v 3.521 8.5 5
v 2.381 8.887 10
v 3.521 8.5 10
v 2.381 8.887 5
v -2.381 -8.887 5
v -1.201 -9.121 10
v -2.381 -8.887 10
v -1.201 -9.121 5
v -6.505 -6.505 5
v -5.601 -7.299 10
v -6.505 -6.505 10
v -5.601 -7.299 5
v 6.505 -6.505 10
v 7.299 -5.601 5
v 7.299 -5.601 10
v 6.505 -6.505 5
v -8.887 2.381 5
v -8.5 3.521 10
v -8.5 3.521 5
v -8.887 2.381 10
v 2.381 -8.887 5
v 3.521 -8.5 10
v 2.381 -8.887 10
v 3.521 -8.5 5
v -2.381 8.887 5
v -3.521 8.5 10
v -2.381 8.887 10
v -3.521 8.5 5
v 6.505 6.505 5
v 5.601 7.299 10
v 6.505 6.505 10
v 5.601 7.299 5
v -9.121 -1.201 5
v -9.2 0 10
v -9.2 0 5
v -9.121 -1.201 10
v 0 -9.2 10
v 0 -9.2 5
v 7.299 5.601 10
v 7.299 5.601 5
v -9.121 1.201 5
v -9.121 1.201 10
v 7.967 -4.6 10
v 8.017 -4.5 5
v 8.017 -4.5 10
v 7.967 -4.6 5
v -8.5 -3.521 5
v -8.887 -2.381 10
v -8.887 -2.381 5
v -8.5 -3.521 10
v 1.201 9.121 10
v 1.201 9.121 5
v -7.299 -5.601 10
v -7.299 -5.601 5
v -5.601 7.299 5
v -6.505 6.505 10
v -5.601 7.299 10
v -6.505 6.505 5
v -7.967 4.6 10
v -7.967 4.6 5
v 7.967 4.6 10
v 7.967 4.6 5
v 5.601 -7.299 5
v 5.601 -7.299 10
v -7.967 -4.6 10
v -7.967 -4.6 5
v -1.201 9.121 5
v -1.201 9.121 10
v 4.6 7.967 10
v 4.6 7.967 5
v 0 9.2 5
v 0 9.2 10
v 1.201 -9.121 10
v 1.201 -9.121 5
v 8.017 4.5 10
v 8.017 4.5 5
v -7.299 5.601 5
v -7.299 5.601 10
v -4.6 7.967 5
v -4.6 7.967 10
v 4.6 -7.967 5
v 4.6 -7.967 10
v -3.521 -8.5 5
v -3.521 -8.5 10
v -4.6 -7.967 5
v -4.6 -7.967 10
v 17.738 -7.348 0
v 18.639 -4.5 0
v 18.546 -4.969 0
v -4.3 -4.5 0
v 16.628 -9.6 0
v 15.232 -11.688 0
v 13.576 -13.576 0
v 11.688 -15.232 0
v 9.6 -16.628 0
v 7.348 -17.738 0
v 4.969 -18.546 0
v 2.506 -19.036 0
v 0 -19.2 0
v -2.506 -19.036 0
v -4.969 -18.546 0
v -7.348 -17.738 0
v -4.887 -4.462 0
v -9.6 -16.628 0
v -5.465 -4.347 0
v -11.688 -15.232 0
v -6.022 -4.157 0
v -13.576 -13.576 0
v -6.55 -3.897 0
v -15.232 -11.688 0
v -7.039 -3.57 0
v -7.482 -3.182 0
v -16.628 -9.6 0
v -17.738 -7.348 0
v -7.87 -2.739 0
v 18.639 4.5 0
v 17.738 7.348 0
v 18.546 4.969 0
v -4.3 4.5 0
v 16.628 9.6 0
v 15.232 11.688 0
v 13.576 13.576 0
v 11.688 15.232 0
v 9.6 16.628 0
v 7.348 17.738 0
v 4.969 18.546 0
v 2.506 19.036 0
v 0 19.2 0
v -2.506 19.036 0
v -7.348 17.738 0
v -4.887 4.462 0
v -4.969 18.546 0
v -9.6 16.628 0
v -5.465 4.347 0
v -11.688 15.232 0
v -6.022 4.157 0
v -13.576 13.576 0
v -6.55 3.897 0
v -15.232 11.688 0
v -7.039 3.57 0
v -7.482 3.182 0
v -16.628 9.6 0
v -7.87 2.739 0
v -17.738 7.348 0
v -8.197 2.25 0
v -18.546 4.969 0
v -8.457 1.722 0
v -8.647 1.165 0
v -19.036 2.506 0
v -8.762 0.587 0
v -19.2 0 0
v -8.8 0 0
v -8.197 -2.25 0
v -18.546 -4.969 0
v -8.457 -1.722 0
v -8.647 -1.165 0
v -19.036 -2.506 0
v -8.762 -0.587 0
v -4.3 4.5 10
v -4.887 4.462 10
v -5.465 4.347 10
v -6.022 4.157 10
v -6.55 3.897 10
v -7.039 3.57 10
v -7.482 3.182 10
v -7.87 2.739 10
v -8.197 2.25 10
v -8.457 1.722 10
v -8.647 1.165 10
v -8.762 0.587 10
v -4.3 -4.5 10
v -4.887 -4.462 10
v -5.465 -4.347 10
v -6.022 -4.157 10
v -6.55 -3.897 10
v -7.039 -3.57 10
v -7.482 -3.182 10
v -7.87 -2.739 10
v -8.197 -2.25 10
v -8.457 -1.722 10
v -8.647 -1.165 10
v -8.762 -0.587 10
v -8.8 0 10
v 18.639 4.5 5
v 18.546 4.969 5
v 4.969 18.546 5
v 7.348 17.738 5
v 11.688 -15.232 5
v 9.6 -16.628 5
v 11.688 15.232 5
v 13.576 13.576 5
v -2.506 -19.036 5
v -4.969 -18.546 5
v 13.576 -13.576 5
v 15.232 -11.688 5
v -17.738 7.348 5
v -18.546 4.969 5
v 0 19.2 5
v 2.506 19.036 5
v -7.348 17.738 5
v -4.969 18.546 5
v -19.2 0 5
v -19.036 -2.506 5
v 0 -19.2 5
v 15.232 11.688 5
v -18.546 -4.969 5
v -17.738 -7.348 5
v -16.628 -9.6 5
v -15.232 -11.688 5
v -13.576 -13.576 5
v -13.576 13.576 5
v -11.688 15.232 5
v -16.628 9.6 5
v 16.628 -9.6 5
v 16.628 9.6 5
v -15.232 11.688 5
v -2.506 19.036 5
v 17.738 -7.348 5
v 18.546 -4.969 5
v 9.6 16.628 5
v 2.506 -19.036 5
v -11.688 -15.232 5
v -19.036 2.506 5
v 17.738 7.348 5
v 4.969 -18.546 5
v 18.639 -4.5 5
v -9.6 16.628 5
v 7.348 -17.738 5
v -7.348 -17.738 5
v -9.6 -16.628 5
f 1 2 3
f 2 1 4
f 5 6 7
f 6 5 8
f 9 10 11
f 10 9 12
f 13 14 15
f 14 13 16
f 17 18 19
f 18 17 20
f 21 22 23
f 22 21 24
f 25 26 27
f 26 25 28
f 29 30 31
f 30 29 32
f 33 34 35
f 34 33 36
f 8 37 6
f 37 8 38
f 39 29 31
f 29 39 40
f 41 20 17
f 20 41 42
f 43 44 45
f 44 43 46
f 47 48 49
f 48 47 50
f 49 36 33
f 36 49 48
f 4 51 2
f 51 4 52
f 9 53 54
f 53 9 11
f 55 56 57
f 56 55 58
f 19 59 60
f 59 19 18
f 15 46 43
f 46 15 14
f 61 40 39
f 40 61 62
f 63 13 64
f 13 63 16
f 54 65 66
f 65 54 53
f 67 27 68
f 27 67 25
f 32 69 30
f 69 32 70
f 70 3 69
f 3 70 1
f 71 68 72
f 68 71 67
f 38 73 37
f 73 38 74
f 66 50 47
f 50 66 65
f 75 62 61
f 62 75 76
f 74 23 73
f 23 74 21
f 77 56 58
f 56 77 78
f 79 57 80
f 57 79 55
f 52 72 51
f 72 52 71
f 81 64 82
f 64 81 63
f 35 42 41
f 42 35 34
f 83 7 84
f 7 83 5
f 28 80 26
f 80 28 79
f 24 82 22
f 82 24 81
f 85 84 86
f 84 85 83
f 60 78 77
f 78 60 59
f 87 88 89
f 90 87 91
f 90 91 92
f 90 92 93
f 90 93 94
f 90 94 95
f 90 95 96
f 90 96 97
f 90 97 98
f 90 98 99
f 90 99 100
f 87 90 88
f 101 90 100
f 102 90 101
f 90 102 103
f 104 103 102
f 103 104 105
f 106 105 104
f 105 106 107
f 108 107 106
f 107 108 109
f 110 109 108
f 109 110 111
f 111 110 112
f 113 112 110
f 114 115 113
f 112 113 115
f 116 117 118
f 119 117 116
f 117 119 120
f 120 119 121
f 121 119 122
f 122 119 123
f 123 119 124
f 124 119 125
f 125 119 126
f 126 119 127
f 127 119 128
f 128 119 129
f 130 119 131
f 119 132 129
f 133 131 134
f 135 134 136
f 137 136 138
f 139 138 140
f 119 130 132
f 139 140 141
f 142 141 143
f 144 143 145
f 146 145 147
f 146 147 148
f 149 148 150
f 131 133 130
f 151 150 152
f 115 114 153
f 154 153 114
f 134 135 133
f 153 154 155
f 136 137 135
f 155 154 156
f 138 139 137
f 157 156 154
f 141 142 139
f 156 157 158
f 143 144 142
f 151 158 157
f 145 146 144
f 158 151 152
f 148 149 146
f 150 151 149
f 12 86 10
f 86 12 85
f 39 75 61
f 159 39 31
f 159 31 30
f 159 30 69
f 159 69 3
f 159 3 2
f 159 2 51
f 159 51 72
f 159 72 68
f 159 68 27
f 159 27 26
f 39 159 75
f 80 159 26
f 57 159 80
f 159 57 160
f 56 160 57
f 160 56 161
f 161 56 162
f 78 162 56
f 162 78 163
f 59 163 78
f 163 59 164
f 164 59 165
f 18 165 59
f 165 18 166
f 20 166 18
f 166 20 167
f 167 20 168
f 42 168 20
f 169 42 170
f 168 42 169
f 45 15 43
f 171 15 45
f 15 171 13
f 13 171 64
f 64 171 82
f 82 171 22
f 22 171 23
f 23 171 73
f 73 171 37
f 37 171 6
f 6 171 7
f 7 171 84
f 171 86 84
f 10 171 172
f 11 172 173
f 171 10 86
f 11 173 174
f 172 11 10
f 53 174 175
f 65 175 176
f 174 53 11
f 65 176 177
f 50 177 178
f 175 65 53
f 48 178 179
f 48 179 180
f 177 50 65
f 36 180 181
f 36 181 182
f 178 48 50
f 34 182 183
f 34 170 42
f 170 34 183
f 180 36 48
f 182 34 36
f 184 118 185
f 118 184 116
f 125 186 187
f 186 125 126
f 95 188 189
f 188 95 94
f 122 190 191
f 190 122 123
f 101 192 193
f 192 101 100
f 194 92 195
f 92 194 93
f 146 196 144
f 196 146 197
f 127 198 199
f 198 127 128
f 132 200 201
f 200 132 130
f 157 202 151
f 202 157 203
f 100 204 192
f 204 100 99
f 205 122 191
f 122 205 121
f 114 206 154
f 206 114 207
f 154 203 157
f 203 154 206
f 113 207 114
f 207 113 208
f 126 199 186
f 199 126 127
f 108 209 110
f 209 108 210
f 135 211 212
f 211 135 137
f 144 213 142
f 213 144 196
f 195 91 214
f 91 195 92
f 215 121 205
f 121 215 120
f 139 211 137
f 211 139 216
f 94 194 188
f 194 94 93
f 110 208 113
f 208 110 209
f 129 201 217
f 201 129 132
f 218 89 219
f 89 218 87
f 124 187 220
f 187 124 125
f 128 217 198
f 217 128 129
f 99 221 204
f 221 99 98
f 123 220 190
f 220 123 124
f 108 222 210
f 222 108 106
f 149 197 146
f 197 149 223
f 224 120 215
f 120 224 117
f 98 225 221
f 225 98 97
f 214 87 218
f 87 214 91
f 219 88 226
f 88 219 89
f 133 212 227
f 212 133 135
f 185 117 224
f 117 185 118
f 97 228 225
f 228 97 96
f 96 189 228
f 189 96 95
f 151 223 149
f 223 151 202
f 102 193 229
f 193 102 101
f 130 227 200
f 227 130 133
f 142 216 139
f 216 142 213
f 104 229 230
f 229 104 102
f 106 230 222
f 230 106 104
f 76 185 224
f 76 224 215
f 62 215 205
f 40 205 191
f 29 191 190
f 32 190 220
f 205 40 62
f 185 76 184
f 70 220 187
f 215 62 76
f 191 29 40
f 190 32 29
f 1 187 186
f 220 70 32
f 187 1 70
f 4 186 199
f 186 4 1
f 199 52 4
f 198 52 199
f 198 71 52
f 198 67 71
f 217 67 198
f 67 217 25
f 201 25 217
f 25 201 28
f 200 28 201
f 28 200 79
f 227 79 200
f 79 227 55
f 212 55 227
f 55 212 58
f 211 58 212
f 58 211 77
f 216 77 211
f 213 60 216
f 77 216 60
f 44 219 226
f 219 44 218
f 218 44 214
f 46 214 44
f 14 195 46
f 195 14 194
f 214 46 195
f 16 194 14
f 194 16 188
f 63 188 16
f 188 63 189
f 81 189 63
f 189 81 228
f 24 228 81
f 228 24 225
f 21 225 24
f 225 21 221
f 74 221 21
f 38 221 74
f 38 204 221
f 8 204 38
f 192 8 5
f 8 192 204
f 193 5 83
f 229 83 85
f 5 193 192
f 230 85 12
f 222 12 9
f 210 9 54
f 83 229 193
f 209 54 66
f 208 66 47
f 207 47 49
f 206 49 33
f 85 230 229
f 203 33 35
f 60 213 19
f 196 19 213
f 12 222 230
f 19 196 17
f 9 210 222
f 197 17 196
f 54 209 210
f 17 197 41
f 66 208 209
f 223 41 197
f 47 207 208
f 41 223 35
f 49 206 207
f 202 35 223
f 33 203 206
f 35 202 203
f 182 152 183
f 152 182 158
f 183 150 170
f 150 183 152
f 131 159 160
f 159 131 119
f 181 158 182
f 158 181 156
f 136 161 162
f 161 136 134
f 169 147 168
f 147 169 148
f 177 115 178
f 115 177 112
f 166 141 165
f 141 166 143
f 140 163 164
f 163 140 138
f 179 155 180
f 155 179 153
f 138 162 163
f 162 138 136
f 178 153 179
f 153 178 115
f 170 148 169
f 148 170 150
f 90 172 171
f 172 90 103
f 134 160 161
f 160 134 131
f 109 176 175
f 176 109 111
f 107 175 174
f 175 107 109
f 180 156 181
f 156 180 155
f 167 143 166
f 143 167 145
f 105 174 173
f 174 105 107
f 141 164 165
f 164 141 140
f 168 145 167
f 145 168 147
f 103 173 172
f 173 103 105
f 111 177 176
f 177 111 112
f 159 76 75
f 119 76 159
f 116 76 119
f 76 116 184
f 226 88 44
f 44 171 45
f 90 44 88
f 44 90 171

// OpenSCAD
//###############################################################################
//#                                                                             #
//###############################################################################
//#    Copyright 2020 Dirk Heisswolf                                            #
//#    This file is part of the DIY Laser Bed project.                          #
//#                                                                             #
//#    This project is free software: you can redistribute it and/or modify     #
//#    it under the terms of the GNU General Public License as published by     #
//#    the Free Software Foundation, either version 3 of the License, or        #
//#    (at your option) any later version.                                      #
//#                                                                             #
//#    This project is distributed in the hope that it will be useful,          #
//#    but WITHOUT ANY WARRANTY; without even the implied warranty of           #
//#    MERCHANTABILITY or FITNESS FOR A PARTICULAR PURPOSE.  See the            #
//#    GNU General Public License for more details.                             #
//#                                                                             #
//#    You should have received a copy of the GNU General Public License        #
//#    along with this project.  If not, see <http://www.gnu.org/licenses/>.    #
//#                                                                             #
//###############################################################################
//# Description:                                                                #
//#   This is a cover to block the UV light at the openings of the tub.         #
//#                                                                             #
//###############################################################################
//# Version History:                                                            #
//#   February 27, 2020                                                         #
//#      - Initial release                                                      #
//#                                                                             #
//###############################################################################
//Parameters
$d_hole      = 18.4;                  //diameter 
$d_cable     =  9;                  //diameter of the cable
$w_cable     = 18;                  //width of the cable slot
$fn          = 48;

module uv_cover() {
    //Body
    difference() {
        union() {
          translate([0,0,0])  cylinder(10,d=$d_hole); 
          translate([0,0,0])  cylinder(5,d=$d_hole+20); 
         }
        union() {
          translate([(($d_hole+$d_cable)/2)-$w_cable,0,-1])  cylinder(12,d=$d_cable); 
          translate([30+(($d_hole-$w_cable-$d_cable)/2),0,5])       cube([60,$d_cable,12],true); 
        }
    }
}

//if ($preview) {

   uv_cover();
//}
